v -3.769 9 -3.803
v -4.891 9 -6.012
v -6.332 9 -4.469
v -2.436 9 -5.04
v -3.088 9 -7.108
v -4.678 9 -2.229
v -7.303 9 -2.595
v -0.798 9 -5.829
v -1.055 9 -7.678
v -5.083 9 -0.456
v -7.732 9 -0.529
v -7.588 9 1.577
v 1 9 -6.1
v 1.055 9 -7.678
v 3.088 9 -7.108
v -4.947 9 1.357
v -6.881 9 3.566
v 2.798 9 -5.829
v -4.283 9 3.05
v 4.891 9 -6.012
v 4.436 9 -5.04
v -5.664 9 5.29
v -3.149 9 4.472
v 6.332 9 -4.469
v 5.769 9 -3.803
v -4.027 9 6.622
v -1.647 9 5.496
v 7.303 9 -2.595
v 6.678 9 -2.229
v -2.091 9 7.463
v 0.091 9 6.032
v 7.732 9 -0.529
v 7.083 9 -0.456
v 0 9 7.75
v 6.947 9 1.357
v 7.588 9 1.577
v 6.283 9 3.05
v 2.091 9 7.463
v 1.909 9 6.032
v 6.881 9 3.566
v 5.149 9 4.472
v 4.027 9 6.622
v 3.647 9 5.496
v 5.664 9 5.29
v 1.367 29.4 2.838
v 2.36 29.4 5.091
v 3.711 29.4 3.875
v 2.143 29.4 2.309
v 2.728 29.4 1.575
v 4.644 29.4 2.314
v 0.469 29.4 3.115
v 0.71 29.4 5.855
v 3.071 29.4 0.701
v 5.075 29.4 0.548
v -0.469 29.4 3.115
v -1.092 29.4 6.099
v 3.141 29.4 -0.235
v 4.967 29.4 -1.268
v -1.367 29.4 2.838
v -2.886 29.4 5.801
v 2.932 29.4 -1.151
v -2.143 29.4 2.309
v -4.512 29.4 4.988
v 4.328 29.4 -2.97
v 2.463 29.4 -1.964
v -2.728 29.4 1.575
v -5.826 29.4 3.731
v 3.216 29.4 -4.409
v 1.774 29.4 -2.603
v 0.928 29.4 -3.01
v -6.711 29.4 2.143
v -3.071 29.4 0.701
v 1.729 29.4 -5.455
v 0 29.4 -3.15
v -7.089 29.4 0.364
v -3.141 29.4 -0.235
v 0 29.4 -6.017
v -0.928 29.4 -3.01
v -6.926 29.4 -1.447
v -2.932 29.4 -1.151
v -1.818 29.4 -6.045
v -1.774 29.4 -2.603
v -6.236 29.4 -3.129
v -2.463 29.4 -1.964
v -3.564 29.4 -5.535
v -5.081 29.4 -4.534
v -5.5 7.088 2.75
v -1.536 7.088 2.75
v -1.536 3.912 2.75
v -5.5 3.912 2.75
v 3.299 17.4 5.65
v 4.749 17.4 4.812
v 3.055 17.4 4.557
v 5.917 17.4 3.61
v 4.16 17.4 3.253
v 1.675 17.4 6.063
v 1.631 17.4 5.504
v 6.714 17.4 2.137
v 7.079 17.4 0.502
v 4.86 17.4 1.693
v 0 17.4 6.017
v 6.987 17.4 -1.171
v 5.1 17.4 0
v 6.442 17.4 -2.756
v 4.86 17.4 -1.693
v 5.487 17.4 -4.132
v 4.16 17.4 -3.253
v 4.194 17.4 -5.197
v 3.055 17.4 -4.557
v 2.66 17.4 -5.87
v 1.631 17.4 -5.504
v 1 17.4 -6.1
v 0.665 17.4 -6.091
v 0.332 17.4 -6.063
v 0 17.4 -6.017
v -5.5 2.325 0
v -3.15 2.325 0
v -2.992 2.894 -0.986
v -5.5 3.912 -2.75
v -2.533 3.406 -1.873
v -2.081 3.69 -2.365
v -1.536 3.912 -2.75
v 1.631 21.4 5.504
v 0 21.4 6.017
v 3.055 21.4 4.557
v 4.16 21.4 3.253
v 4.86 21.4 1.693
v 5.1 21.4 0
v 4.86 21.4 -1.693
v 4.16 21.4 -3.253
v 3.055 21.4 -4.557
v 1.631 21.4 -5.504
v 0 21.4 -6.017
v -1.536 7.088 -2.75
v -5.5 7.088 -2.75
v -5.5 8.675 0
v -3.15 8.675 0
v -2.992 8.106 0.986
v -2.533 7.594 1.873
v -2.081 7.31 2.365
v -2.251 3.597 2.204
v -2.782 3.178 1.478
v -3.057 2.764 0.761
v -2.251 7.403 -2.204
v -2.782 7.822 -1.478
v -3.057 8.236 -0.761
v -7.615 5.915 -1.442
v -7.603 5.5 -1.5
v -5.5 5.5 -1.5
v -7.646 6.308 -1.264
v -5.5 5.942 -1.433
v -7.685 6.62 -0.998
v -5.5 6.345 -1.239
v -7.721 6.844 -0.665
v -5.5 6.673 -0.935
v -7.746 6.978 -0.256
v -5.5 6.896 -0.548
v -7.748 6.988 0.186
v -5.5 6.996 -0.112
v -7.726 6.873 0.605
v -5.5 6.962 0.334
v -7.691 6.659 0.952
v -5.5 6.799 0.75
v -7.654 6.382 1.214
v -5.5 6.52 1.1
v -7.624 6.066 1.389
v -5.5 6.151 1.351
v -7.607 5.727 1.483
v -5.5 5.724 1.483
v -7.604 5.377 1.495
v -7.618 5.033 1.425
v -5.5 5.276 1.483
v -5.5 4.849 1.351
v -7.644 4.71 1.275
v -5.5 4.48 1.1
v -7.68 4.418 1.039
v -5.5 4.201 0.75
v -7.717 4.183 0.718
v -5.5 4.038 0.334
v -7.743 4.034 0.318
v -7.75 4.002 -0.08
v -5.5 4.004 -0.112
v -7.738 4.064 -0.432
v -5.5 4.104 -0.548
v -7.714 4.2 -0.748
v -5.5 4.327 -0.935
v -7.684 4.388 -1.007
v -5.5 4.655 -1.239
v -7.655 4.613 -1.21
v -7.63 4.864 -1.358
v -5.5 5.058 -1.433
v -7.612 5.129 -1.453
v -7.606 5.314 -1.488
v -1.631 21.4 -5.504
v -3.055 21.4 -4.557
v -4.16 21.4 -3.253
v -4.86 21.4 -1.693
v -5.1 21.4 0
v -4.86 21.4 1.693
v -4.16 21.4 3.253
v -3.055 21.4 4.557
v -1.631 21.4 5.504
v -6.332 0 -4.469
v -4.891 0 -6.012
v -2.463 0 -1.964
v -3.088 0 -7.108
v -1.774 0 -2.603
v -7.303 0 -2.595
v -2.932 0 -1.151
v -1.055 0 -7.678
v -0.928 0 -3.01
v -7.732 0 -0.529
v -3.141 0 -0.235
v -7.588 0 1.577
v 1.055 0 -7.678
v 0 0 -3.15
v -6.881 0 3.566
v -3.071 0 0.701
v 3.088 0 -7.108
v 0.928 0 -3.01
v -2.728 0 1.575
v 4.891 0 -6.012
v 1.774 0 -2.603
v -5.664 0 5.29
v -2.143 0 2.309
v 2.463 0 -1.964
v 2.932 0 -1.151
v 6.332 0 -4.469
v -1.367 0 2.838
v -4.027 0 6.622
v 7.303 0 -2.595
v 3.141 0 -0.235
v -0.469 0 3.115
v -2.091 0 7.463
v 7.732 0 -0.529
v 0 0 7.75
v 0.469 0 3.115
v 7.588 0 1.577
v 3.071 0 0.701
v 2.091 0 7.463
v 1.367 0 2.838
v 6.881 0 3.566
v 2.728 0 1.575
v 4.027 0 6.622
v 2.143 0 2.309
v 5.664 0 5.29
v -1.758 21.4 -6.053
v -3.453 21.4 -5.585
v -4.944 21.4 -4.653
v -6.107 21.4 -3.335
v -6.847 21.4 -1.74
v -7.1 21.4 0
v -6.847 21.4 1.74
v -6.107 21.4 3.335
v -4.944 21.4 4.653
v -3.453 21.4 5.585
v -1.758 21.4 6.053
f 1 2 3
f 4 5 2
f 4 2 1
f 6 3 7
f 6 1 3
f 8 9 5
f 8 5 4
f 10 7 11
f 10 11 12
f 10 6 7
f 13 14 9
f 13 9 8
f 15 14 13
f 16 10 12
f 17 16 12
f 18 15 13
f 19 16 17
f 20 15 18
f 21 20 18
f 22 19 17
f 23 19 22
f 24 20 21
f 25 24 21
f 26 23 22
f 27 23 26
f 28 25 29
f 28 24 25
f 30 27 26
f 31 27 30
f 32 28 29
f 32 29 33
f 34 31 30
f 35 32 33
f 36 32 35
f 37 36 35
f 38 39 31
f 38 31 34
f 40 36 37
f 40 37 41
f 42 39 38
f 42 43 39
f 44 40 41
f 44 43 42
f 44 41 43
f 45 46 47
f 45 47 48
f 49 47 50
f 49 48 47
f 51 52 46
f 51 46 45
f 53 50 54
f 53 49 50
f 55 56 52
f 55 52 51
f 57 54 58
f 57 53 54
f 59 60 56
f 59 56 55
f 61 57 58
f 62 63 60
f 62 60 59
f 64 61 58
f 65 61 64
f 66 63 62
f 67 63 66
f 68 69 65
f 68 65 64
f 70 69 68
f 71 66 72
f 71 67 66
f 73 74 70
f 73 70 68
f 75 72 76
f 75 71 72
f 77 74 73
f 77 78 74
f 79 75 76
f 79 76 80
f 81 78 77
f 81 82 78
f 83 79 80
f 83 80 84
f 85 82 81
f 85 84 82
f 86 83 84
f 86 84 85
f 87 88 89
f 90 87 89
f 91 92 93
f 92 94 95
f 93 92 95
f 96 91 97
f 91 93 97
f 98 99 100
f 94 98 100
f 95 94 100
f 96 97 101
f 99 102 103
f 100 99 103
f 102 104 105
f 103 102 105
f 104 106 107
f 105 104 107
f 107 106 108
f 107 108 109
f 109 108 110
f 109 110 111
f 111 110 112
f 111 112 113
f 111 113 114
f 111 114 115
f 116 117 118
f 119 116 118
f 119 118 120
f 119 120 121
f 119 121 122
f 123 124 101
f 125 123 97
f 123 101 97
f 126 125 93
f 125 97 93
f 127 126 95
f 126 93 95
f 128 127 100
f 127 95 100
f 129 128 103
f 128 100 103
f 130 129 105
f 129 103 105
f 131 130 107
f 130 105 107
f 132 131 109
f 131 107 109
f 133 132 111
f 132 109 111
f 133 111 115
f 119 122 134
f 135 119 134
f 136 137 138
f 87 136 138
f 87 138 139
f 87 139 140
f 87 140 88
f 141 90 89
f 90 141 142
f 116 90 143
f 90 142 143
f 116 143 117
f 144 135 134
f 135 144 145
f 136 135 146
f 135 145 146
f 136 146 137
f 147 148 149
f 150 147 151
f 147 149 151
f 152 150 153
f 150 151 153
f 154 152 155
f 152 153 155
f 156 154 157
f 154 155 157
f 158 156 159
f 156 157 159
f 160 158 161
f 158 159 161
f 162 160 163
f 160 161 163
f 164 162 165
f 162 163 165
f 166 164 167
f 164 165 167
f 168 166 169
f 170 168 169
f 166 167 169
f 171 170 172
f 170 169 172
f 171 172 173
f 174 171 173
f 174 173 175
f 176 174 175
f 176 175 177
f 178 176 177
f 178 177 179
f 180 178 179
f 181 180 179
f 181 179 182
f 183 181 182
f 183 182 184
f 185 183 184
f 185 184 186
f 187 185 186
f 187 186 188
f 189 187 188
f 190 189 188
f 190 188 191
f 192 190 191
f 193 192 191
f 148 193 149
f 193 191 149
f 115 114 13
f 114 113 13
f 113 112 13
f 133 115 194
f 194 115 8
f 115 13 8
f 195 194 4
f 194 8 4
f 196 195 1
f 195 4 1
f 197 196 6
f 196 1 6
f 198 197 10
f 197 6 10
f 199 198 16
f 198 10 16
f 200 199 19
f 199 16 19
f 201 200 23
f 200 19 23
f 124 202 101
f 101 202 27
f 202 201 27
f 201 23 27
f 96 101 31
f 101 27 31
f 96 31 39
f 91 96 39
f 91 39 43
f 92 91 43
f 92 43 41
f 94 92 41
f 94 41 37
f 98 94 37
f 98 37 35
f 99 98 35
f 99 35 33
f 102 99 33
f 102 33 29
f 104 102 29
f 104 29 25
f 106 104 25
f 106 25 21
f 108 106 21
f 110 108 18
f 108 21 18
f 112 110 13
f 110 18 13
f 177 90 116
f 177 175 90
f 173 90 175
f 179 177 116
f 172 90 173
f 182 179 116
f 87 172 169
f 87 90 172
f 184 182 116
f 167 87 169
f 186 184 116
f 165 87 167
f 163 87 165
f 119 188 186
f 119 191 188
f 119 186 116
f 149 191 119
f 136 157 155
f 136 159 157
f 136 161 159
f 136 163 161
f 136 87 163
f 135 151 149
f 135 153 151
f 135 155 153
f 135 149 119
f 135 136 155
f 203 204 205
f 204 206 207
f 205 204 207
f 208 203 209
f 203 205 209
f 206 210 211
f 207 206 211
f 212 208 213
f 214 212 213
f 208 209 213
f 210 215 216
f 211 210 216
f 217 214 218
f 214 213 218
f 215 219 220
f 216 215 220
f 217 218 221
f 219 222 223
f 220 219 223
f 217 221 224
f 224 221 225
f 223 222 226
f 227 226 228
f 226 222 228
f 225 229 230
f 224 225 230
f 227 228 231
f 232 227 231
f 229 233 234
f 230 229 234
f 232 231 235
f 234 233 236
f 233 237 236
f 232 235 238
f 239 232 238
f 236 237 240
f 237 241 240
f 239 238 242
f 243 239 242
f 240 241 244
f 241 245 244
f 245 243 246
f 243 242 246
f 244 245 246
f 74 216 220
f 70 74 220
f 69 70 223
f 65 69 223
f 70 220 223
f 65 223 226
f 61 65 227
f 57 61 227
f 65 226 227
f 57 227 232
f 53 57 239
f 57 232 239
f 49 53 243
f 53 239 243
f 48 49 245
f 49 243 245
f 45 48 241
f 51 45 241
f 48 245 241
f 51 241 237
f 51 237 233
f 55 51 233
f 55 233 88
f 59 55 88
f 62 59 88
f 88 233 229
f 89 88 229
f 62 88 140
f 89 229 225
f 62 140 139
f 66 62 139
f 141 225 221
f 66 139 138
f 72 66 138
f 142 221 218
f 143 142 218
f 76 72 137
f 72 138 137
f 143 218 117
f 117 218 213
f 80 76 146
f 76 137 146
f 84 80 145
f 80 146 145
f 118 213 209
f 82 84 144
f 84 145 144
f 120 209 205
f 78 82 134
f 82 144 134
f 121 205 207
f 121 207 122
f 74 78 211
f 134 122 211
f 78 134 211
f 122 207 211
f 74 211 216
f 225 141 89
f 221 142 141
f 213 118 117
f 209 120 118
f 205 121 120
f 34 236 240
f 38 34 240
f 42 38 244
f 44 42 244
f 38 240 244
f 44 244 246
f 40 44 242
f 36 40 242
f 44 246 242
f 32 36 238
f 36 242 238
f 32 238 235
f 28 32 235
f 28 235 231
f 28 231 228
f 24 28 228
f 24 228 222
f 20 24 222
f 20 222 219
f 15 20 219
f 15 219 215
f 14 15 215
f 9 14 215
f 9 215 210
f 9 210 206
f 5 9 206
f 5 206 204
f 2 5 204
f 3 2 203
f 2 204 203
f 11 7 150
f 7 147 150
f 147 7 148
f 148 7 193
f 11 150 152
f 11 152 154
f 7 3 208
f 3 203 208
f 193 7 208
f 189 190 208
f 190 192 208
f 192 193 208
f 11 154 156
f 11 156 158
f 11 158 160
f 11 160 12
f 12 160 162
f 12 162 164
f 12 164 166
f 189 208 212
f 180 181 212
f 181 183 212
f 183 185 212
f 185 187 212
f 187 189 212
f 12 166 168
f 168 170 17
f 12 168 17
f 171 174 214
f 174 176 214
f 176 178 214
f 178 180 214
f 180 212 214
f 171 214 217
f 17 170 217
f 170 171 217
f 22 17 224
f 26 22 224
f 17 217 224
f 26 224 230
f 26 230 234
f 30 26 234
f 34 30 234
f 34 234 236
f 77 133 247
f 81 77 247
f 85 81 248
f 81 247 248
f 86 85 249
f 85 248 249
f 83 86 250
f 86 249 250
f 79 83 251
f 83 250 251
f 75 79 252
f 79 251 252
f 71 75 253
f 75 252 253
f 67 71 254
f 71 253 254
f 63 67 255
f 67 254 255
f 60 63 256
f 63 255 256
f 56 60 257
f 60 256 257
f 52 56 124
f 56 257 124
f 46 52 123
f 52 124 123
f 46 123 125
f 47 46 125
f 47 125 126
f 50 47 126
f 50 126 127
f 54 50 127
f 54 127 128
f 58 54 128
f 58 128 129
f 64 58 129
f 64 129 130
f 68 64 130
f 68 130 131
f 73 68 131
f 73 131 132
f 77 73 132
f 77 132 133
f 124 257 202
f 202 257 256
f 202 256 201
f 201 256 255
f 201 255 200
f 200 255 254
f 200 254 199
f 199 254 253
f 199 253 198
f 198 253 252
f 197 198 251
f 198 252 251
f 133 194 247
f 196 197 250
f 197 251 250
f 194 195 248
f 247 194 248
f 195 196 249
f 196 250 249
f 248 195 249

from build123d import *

# Parameters (mm, degrees)
SKETCH1_R           = 7.75
BOSS_EXTRUDE1_DEPTH = 9
SKETCH2_R           = 6.1
BOSS_EXTRUDE2_DEPTH = 12.4
SKETCH4_R           = 6.1
BOSS_EXTRUDE4_DEPTH = 8
SKETCH5_R           = 3.15
CUT_EXTRUDE1_DEPTH  = 32.376503948
SKETCH8_R           = 1.5
CUT_EXTRUDE3_DEPTH  = 32.376503948
SKETCH10_R          = 1.5
CUT_EXTRUDE4_DEPTH  = 5.5
CUT_EXTRUDE5_START  = -4
CUT_EXTRUDE5_DEPTH  = 4


with BuildPart() as part:
    # Sketch1 → Boss-Extrude1 (new body)
    with BuildSketch(Plane(origin=(0, 0, 0), x_dir=(1, 0, 0), z_dir=(0, 1, 0))):
        with Locations(Location((0, 0, 0), (0, 0, 270))):
            Circle(SKETCH1_R)
    extrude(amount=BOSS_EXTRUDE1_DEPTH)

    # Sketch2 → Boss-Extrude2 (add)
    with BuildSketch(Plane(origin=(0, 9, 0), x_dir=(1, 0, 0), z_dir=(0, 1, 0))):
        with Locations(Location((1, 0, 0), (0, 0, 90))):
            Circle(SKETCH2_R)
    extrude(amount=BOSS_EXTRUDE2_DEPTH)

    # Sketch4 → Boss-Extrude4 (add)
    with BuildSketch(Plane(origin=(0, 21.4, 0), x_dir=(1, 0, 0), z_dir=(0, 1, 0))):
        with Locations(Location((-1, 0, 0), (0, 0, 80.564661277))):
            Circle(SKETCH4_R)
    extrude(amount=BOSS_EXTRUDE4_DEPTH)

    # Sketch5 → Cut-Extrude1 (cut, through all)
    with BuildSketch(Plane.XZ):
        with Locations(Location((0, 0, 0), (0, 0, 270))):
            Circle(SKETCH5_R)
    extrude(amount=-CUT_EXTRUDE1_DEPTH, mode=Mode.SUBTRACT)

    # Sketch8 → Cut-Extrude3 (cut, through all)
    with BuildSketch(Plane(origin=(0, 0, 0), x_dir=(0, 0, -1), z_dir=(1, 0, 0))):
        with Locations((0, 5.5)):
            Circle(SKETCH8_R)
    extrude(amount=-CUT_EXTRUDE3_DEPTH, mode=Mode.SUBTRACT)

    # Sketch10 → Cut-Extrude4 (cut)
    with BuildSketch(Plane(origin=(0, 0, 0), x_dir=(0, 0, -1), z_dir=(1, 0, 0))):
        Polygon((0, 8.675426481), (-2.75, 7.08771324), (-2.75, 3.91228676), (0, 2.324573519), (2.75, 3.91228676), (2.75, 7.08771324), align=None)
        with Locations((0, 5.5)):
            Circle(SKETCH10_R, mode=Mode.SUBTRACT)
    extrude(amount=-CUT_EXTRUDE4_DEPTH, mode=Mode.SUBTRACT)

    # Sketch11 → Cut-Extrude5 (cut)
    with BuildSketch(Plane(origin=(0, 21.4, 0), x_dir=(1, 0, 0), z_dir=(0, 1, 0)).offset(CUT_EXTRUDE5_START)):
        with BuildLine():
            ThreePointArc((0, -6.017474553), (5.1, 0), (0, 6.017474553))
            ThreePointArc((0, 6.017474553), (7.1, 0), (0, -6.017474553))
        make_face()
    extrude(amount=CUT_EXTRUDE5_DEPTH, mode=Mode.SUBTRACT)


solid = part.part
